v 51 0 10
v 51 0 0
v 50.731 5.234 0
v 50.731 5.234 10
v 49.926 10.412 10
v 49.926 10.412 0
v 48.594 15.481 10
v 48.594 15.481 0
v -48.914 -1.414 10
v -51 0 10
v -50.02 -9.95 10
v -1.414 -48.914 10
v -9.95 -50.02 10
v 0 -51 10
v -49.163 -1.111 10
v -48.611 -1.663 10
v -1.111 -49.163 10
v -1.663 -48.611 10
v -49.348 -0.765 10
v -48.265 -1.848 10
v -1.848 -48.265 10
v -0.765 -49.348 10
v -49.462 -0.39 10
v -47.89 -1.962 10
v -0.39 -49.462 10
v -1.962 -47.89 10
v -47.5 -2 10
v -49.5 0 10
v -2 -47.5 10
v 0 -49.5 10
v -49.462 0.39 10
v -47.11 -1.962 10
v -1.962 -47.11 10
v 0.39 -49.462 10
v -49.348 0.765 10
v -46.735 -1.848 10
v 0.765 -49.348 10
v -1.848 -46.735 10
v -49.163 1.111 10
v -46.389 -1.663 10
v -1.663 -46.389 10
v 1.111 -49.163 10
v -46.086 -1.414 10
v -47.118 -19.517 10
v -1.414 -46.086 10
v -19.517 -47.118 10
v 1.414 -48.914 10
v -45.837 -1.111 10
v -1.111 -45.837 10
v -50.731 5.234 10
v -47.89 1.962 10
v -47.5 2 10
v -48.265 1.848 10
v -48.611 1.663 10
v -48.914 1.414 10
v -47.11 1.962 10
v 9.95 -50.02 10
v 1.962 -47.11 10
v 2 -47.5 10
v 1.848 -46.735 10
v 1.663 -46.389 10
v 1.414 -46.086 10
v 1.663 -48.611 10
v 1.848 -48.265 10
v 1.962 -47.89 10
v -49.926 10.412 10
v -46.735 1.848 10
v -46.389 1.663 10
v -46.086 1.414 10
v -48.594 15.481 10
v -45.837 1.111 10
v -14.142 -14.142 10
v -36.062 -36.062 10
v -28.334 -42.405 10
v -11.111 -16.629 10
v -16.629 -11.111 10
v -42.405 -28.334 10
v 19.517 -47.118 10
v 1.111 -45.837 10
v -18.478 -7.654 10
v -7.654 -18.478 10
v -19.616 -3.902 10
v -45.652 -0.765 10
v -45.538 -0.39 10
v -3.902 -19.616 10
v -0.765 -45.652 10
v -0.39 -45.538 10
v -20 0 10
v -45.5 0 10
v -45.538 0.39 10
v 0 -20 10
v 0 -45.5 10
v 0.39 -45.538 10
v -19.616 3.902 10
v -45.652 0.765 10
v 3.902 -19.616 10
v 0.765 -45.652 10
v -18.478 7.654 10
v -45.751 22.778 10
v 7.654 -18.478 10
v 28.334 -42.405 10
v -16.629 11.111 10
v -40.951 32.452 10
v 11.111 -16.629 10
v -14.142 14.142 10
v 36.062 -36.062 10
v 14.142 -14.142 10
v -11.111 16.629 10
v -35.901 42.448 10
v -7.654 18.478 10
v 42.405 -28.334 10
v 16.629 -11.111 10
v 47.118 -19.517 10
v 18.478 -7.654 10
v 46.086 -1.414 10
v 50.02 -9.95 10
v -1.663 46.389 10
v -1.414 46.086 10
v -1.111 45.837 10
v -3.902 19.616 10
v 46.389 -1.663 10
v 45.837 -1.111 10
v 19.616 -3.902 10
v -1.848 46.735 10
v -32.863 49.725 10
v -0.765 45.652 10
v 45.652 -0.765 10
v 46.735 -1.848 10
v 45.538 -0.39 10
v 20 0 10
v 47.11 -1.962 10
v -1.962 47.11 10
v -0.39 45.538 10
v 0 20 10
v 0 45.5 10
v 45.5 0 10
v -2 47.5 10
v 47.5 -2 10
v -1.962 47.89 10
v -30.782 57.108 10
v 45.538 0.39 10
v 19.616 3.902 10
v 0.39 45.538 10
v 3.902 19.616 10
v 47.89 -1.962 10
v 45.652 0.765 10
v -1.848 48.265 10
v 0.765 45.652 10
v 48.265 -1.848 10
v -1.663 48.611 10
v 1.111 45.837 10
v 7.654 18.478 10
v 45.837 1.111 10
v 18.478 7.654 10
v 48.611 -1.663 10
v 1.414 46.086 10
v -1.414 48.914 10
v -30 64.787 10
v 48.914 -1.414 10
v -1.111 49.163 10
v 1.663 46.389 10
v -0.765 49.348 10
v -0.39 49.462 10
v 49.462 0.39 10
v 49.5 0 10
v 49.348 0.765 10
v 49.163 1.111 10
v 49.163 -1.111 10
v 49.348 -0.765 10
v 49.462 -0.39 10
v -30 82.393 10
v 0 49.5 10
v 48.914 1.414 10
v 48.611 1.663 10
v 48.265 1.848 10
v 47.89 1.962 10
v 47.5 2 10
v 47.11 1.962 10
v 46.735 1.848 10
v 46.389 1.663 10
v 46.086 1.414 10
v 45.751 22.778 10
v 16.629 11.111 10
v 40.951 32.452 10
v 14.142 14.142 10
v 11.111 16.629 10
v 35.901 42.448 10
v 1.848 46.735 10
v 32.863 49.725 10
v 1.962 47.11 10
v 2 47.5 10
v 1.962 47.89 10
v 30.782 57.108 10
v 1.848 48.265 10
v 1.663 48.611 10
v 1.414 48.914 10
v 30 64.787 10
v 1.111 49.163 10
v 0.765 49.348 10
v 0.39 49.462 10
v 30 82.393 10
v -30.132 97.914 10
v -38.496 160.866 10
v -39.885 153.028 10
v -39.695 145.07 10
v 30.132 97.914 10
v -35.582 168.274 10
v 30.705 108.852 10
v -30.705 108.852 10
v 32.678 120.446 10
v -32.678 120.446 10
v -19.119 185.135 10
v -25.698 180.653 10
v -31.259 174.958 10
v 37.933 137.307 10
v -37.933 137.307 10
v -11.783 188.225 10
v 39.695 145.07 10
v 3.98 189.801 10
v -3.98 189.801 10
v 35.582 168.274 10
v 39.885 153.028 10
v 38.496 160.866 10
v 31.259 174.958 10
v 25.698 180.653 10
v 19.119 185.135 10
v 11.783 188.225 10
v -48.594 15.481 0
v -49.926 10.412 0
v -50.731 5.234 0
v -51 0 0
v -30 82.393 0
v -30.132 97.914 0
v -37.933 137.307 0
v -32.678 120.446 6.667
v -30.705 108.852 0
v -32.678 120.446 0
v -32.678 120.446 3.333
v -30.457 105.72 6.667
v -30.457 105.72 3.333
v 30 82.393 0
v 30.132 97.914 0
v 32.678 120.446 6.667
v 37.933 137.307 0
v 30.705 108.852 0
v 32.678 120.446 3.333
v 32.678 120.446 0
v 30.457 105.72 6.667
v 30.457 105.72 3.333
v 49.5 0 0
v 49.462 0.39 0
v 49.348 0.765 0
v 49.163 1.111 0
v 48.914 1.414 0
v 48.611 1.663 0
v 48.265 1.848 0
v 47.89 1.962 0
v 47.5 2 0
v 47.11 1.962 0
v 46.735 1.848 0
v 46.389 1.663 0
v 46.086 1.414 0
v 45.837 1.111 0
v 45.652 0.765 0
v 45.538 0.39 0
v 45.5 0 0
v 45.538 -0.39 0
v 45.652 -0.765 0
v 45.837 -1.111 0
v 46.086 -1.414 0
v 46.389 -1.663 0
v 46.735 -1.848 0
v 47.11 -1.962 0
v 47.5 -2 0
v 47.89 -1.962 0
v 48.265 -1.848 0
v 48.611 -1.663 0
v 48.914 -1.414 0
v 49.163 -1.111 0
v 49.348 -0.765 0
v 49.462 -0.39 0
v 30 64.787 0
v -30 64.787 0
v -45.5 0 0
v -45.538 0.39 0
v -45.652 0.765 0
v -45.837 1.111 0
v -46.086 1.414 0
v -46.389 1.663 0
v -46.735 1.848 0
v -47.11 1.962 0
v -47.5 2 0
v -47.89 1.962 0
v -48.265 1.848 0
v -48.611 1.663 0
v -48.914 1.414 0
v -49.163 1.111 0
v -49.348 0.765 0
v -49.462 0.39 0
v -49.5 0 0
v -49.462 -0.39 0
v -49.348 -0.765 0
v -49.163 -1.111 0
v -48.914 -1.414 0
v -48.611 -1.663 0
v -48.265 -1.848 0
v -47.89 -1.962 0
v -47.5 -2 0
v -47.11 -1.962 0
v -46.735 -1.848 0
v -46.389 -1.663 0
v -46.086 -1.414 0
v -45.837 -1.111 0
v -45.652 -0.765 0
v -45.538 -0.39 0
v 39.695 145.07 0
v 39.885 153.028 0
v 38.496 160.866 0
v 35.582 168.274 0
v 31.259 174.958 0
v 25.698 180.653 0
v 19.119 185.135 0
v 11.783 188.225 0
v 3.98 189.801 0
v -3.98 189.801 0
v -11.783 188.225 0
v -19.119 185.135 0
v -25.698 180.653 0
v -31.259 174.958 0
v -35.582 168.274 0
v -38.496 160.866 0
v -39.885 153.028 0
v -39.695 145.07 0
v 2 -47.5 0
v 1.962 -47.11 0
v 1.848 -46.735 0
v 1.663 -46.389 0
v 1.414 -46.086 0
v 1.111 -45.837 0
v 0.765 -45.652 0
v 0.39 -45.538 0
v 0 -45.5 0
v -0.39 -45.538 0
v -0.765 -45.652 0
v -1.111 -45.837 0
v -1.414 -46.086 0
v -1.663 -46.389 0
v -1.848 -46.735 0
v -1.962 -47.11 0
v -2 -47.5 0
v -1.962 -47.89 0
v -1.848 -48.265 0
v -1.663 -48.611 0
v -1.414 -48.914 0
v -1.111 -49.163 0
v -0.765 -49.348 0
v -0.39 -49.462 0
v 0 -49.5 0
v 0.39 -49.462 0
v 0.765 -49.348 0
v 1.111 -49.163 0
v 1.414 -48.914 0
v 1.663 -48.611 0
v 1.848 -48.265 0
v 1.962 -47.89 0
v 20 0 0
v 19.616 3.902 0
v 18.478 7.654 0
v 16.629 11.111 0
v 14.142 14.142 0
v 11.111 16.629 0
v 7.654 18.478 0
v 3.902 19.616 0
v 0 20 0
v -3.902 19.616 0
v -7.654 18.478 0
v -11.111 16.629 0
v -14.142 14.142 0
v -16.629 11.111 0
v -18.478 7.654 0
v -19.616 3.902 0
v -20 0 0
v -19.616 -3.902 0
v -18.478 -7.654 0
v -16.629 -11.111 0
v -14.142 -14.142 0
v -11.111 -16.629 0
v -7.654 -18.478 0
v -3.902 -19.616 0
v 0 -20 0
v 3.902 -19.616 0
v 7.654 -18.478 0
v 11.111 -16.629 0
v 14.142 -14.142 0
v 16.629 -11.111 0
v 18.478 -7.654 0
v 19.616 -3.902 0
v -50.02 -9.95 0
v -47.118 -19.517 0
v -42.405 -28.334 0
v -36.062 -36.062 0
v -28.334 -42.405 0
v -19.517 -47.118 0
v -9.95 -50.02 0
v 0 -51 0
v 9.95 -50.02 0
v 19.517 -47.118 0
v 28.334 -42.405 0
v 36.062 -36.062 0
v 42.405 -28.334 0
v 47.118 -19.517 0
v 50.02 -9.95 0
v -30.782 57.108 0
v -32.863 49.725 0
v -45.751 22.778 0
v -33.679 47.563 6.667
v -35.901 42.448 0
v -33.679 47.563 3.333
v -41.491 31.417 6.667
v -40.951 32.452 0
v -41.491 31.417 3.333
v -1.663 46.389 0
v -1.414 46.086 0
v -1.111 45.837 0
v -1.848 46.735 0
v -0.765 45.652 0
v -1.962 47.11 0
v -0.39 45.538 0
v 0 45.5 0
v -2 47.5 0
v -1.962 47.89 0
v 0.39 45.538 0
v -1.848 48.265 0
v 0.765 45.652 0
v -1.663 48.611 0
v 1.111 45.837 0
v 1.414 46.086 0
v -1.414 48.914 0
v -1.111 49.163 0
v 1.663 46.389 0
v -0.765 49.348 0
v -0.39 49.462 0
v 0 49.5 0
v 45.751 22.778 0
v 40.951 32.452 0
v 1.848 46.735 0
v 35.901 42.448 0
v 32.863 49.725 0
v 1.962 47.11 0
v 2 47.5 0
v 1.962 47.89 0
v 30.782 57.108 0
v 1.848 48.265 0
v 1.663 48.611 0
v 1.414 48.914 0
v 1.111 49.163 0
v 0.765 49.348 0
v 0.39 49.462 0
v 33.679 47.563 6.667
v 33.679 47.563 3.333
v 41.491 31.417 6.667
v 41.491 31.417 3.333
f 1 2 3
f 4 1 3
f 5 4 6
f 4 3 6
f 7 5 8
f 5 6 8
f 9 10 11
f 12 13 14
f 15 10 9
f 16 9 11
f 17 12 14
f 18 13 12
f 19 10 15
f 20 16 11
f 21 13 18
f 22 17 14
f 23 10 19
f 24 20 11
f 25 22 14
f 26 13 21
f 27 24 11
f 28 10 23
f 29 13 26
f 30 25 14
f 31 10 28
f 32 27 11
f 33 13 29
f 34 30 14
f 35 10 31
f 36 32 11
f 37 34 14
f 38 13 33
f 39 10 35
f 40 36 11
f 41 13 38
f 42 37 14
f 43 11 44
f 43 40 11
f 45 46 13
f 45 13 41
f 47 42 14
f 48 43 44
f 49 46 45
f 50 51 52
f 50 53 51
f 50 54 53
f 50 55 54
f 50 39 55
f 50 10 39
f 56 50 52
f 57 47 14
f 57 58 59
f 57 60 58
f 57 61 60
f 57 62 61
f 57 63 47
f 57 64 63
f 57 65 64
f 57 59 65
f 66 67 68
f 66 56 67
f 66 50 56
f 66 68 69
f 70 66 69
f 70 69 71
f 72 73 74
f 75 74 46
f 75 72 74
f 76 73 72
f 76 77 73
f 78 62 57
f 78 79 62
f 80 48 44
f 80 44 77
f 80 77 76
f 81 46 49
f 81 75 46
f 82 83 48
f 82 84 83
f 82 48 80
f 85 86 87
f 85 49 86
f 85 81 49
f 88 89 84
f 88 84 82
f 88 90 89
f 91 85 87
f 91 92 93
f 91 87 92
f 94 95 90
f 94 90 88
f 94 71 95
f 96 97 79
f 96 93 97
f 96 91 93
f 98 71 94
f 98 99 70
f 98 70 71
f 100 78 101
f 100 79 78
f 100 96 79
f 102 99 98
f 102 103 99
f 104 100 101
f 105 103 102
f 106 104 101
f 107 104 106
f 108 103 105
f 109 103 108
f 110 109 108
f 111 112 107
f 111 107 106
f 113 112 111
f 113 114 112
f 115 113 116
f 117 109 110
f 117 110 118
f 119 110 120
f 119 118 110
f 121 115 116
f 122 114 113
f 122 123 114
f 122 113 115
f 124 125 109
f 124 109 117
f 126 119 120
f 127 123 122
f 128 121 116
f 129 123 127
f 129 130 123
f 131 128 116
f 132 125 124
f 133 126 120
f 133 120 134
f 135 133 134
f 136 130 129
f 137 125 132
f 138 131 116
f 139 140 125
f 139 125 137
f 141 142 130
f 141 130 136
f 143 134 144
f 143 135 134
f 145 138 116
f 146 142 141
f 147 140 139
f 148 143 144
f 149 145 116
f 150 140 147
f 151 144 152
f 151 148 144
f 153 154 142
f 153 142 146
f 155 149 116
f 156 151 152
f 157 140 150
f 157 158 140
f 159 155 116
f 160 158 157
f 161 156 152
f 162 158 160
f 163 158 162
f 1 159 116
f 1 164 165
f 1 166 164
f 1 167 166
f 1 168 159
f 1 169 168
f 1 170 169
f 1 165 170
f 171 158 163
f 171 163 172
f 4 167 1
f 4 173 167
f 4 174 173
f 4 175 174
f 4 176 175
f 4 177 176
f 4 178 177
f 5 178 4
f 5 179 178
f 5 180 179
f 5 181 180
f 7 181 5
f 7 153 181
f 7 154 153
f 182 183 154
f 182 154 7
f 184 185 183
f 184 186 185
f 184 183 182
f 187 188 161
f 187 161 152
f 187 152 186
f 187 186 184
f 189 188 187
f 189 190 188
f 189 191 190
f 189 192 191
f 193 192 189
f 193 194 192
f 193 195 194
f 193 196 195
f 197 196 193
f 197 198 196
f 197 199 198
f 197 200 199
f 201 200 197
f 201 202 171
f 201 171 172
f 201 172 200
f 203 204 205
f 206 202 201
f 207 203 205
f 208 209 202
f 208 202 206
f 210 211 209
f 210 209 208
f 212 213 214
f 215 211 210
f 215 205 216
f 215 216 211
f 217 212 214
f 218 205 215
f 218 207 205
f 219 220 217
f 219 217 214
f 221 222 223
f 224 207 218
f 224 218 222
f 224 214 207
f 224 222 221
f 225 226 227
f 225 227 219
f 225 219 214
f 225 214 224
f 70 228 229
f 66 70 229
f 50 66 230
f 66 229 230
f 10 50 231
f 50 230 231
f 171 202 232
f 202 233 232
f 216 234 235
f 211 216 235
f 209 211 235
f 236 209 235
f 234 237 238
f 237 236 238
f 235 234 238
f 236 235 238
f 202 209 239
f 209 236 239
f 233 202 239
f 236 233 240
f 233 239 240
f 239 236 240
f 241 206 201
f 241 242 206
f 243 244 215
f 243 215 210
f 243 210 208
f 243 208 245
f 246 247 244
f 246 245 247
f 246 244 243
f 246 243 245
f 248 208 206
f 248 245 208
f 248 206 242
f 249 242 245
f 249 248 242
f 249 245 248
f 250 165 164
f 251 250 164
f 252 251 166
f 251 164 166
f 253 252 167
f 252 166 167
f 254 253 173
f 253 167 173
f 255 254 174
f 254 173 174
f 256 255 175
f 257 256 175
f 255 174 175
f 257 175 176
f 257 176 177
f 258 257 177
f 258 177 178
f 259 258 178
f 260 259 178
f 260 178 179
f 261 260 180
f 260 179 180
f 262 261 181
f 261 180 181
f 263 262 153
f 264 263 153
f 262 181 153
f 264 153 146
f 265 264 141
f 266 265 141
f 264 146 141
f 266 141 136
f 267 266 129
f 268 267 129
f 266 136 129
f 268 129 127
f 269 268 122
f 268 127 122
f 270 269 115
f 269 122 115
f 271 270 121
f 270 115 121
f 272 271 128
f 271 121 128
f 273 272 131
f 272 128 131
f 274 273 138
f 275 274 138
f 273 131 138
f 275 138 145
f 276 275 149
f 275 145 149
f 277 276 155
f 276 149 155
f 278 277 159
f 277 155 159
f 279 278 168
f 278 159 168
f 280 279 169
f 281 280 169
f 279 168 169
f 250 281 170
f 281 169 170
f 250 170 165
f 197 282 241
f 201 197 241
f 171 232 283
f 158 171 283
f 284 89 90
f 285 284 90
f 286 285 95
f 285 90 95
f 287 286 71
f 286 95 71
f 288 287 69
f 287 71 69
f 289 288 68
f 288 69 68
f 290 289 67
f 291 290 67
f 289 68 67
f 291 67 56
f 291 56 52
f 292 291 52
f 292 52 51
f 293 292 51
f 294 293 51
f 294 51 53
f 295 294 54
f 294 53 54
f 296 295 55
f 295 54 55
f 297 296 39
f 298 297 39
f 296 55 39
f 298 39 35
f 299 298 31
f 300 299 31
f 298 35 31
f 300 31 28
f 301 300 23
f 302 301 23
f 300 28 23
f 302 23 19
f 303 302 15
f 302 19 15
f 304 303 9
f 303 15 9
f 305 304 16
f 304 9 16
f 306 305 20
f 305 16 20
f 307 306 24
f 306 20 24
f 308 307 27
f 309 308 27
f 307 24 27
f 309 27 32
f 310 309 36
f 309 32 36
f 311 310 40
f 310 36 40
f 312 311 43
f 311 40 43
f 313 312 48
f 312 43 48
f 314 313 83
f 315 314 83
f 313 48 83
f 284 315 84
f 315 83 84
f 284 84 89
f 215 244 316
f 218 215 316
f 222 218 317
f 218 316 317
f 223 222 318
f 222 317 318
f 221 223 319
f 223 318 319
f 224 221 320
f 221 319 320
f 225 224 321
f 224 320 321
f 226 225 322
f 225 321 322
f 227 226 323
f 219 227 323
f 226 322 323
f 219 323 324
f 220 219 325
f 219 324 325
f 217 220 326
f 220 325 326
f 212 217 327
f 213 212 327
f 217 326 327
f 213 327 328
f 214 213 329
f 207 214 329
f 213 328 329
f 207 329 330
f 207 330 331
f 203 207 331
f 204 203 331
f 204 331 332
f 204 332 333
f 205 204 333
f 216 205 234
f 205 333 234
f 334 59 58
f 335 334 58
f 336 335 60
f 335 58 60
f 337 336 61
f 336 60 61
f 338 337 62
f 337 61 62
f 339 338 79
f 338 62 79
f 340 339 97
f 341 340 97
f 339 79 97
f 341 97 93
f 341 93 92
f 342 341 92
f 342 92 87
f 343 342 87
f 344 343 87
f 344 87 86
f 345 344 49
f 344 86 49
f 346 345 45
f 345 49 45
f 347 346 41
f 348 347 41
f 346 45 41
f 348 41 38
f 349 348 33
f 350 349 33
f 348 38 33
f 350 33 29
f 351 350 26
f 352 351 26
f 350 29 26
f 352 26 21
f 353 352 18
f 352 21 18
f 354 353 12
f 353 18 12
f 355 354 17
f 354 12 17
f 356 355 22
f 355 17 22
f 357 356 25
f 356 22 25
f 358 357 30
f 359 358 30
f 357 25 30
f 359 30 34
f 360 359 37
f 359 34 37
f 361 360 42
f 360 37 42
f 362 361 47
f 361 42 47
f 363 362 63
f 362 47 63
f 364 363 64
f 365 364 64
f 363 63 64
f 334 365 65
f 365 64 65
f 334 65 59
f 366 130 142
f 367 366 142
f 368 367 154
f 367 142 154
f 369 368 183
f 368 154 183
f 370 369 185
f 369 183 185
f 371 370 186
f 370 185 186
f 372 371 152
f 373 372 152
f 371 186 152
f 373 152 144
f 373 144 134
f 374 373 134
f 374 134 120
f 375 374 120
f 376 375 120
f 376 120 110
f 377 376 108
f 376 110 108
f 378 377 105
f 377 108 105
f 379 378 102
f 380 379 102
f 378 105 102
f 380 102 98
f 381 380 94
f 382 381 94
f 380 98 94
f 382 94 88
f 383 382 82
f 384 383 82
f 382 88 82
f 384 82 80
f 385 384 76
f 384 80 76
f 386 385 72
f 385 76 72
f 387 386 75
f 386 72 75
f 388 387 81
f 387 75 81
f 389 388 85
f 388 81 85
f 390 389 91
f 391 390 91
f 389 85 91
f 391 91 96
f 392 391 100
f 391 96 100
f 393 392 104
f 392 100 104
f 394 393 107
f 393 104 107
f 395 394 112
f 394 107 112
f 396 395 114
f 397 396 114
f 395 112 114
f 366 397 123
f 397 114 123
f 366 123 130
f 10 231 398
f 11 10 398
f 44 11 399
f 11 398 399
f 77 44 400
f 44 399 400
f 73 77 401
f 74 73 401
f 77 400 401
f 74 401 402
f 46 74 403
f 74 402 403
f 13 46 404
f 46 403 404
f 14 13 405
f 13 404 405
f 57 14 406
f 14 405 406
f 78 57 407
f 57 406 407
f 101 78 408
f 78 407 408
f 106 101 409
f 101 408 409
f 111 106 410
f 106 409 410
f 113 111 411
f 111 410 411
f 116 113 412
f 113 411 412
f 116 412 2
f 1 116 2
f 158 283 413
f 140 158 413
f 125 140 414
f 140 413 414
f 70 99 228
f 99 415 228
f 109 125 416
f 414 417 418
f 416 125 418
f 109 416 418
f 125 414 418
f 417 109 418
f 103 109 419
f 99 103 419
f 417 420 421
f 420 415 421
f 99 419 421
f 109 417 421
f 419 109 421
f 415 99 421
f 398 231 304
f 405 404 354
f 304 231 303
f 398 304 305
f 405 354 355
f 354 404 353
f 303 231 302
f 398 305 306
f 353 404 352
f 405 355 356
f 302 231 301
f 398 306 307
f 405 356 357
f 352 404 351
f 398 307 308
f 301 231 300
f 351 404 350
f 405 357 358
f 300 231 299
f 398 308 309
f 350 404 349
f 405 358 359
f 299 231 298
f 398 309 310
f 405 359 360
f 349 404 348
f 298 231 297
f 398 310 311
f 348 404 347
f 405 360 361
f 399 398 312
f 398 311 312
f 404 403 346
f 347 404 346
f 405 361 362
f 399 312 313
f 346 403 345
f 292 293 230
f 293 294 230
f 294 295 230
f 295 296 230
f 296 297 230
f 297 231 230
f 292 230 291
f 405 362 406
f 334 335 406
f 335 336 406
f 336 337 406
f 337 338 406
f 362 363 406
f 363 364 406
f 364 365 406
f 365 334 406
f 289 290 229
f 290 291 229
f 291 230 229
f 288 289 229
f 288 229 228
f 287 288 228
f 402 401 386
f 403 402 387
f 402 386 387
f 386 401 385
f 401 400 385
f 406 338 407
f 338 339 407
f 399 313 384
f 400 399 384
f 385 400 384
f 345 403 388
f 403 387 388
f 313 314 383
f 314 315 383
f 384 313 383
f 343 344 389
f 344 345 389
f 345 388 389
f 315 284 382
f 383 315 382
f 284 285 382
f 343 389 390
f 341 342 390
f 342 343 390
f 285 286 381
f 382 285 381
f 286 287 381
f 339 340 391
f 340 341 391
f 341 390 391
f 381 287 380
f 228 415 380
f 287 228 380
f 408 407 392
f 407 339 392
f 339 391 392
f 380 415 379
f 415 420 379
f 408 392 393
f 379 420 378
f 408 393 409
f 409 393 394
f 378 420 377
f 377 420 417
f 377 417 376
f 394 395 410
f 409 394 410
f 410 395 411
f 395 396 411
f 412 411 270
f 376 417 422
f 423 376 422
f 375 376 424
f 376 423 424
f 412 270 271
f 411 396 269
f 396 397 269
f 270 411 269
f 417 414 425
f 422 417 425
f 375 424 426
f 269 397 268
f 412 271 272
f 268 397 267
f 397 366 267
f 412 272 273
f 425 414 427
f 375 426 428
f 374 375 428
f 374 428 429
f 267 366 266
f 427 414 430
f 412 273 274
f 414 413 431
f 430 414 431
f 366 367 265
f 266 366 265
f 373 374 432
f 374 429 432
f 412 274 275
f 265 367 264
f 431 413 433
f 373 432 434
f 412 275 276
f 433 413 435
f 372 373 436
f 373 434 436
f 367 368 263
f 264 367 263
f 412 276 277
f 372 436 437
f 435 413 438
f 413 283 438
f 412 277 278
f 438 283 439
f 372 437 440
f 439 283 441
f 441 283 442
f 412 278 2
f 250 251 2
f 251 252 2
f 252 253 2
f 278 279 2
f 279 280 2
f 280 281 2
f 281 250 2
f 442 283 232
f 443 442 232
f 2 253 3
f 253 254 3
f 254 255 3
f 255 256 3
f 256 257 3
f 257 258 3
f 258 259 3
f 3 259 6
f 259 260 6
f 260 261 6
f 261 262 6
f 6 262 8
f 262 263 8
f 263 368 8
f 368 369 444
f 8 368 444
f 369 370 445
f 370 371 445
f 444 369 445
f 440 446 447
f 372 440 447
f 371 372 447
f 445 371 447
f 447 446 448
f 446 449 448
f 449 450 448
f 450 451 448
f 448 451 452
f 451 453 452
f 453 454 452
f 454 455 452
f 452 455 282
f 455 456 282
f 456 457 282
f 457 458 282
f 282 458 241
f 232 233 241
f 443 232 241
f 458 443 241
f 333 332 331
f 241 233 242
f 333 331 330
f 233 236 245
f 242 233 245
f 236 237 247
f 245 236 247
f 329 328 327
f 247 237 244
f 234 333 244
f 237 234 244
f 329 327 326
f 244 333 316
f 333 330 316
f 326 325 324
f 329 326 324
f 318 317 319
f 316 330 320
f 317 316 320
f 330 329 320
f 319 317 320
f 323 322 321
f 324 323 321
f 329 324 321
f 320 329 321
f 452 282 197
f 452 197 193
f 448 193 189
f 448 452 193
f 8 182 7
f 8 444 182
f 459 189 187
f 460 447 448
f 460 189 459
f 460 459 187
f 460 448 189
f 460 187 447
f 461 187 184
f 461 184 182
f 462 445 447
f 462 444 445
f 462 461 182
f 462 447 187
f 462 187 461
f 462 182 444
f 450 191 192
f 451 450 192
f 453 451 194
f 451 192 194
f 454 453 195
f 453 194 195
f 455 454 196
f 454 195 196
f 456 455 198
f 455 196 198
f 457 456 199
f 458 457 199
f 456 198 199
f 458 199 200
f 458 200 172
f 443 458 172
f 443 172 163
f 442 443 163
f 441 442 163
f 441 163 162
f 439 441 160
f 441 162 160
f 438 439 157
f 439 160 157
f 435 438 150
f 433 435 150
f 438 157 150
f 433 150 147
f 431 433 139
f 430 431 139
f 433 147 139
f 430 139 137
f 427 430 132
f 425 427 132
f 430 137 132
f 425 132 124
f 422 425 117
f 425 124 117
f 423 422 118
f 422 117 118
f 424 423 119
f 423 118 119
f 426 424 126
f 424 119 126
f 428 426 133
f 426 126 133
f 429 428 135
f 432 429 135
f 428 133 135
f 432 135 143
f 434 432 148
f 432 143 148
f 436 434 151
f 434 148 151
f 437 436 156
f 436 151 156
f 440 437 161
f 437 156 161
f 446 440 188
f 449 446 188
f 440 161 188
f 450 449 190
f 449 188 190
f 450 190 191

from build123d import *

# Parameters (mm, degrees)
BOSS_EXTRUDE1_DEPTH = 10
SKETCH3_R           = 2
SKETCH3_R_2         = 20
CUT_EXTRUDE1_DEPTH  = 10


with BuildPart() as part:
    # Sketch2 → Boss-Extrude1 (new body)
    with BuildSketch(Plane.XY):
        with BuildLine():
            ThreePointArc((30, 41.243181255), (41.354060385, 29.846971198), (48.593569979, 15.481116133))
            add(Edge.make_bspline(
                [(30, 64.78657274), (30, 46.734360232), (43.458104798, 31.600792807), (48.593569979, 15.481116133)],
                knots=[0, 0, 0, 0, 1, 1, 1, 1], degree=3))
            Line((30, 64.78657274), (30, 41.243181255))
        make_face()
        with BuildLine():
            ThreePointArc((-48.593569979, 15.481116133), (-41.354060385, 29.846971198), (-30, 41.243181255))
            Line((-30, 41.243181255), (-30, 64.78657274))
            add(Edge.make_bspline(
                [(-30, 64.78657274), (-30, 46.734360232), (-43.458104798, 31.600792807), (-48.593569979, 15.481116133)],
                knots=[0, 0, 0, 0, 1, 1, 1, 1], degree=3))
        make_face()
        with BuildLine():
            add(Edge.make_bspline(
                [(-37.932636655, 137.306888623), (-30.736363595, 115.801238579), (-30, 113.598295334), (-30, 82.392834072)],
                knots=[0, 0, 0, 0, 1, 1, 1, 1], degree=3))
            Line((-30, 82.392834072), (-30, 123.542486889))
            ThreePointArc((-30, 123.542486889), (-34.65653574, 130.026904834), (-37.932636655, 137.306888623))
        make_face()
        with BuildLine():
            add(Edge.make_bspline(
                [(37.932636655, 137.306888623), (30.736363595, 115.801238579), (30, 113.598295334), (30, 82.392834072)],
                knots=[0, 0, 0, 0, 1, 1, 1, 1], degree=3))
            ThreePointArc((37.932636655, 137.306888623), (34.65653574, 130.026904834), (30, 123.542486889))
            Line((30, 123.542486889), (30, 82.392834072))
        make_face()
        with BuildLine():
            Line((30, 41.243181255), (30, 123.542486889))
            ThreePointArc((30, 123.542486889), (0, 190), (-30, 123.542486889))
            Line((-30, 123.542486889), (-30, 41.243181255))
            ThreePointArc((-30, 41.243181255), (-45.447772223, 23.140872931), (-51, 0))
            ThreePointArc((-51, 0), (0, -51), (51, 0))
            ThreePointArc((51, 0), (45.447772223, 23.140872931), (30, 41.243181255))
        make_face()
    extrude(amount=BOSS_EXTRUDE1_DEPTH)

    # Sketch3 → Cut-Extrude1 (cut)
    with BuildSketch(Plane.XY.offset(10)):
        with Locations((0, -47.5)):
            Circle(SKETCH3_R)
        with Locations((-47.5, 0)):
            Circle(SKETCH3_R)
        with Locations((0, 47.5)):
            Circle(SKETCH3_R)
        with Locations((47.5, 0)):
            Circle(SKETCH3_R)
        Circle(SKETCH3_R_2)
    extrude(amount=-CUT_EXTRUDE1_DEPTH, mode=Mode.SUBTRACT)


solid = part.part
